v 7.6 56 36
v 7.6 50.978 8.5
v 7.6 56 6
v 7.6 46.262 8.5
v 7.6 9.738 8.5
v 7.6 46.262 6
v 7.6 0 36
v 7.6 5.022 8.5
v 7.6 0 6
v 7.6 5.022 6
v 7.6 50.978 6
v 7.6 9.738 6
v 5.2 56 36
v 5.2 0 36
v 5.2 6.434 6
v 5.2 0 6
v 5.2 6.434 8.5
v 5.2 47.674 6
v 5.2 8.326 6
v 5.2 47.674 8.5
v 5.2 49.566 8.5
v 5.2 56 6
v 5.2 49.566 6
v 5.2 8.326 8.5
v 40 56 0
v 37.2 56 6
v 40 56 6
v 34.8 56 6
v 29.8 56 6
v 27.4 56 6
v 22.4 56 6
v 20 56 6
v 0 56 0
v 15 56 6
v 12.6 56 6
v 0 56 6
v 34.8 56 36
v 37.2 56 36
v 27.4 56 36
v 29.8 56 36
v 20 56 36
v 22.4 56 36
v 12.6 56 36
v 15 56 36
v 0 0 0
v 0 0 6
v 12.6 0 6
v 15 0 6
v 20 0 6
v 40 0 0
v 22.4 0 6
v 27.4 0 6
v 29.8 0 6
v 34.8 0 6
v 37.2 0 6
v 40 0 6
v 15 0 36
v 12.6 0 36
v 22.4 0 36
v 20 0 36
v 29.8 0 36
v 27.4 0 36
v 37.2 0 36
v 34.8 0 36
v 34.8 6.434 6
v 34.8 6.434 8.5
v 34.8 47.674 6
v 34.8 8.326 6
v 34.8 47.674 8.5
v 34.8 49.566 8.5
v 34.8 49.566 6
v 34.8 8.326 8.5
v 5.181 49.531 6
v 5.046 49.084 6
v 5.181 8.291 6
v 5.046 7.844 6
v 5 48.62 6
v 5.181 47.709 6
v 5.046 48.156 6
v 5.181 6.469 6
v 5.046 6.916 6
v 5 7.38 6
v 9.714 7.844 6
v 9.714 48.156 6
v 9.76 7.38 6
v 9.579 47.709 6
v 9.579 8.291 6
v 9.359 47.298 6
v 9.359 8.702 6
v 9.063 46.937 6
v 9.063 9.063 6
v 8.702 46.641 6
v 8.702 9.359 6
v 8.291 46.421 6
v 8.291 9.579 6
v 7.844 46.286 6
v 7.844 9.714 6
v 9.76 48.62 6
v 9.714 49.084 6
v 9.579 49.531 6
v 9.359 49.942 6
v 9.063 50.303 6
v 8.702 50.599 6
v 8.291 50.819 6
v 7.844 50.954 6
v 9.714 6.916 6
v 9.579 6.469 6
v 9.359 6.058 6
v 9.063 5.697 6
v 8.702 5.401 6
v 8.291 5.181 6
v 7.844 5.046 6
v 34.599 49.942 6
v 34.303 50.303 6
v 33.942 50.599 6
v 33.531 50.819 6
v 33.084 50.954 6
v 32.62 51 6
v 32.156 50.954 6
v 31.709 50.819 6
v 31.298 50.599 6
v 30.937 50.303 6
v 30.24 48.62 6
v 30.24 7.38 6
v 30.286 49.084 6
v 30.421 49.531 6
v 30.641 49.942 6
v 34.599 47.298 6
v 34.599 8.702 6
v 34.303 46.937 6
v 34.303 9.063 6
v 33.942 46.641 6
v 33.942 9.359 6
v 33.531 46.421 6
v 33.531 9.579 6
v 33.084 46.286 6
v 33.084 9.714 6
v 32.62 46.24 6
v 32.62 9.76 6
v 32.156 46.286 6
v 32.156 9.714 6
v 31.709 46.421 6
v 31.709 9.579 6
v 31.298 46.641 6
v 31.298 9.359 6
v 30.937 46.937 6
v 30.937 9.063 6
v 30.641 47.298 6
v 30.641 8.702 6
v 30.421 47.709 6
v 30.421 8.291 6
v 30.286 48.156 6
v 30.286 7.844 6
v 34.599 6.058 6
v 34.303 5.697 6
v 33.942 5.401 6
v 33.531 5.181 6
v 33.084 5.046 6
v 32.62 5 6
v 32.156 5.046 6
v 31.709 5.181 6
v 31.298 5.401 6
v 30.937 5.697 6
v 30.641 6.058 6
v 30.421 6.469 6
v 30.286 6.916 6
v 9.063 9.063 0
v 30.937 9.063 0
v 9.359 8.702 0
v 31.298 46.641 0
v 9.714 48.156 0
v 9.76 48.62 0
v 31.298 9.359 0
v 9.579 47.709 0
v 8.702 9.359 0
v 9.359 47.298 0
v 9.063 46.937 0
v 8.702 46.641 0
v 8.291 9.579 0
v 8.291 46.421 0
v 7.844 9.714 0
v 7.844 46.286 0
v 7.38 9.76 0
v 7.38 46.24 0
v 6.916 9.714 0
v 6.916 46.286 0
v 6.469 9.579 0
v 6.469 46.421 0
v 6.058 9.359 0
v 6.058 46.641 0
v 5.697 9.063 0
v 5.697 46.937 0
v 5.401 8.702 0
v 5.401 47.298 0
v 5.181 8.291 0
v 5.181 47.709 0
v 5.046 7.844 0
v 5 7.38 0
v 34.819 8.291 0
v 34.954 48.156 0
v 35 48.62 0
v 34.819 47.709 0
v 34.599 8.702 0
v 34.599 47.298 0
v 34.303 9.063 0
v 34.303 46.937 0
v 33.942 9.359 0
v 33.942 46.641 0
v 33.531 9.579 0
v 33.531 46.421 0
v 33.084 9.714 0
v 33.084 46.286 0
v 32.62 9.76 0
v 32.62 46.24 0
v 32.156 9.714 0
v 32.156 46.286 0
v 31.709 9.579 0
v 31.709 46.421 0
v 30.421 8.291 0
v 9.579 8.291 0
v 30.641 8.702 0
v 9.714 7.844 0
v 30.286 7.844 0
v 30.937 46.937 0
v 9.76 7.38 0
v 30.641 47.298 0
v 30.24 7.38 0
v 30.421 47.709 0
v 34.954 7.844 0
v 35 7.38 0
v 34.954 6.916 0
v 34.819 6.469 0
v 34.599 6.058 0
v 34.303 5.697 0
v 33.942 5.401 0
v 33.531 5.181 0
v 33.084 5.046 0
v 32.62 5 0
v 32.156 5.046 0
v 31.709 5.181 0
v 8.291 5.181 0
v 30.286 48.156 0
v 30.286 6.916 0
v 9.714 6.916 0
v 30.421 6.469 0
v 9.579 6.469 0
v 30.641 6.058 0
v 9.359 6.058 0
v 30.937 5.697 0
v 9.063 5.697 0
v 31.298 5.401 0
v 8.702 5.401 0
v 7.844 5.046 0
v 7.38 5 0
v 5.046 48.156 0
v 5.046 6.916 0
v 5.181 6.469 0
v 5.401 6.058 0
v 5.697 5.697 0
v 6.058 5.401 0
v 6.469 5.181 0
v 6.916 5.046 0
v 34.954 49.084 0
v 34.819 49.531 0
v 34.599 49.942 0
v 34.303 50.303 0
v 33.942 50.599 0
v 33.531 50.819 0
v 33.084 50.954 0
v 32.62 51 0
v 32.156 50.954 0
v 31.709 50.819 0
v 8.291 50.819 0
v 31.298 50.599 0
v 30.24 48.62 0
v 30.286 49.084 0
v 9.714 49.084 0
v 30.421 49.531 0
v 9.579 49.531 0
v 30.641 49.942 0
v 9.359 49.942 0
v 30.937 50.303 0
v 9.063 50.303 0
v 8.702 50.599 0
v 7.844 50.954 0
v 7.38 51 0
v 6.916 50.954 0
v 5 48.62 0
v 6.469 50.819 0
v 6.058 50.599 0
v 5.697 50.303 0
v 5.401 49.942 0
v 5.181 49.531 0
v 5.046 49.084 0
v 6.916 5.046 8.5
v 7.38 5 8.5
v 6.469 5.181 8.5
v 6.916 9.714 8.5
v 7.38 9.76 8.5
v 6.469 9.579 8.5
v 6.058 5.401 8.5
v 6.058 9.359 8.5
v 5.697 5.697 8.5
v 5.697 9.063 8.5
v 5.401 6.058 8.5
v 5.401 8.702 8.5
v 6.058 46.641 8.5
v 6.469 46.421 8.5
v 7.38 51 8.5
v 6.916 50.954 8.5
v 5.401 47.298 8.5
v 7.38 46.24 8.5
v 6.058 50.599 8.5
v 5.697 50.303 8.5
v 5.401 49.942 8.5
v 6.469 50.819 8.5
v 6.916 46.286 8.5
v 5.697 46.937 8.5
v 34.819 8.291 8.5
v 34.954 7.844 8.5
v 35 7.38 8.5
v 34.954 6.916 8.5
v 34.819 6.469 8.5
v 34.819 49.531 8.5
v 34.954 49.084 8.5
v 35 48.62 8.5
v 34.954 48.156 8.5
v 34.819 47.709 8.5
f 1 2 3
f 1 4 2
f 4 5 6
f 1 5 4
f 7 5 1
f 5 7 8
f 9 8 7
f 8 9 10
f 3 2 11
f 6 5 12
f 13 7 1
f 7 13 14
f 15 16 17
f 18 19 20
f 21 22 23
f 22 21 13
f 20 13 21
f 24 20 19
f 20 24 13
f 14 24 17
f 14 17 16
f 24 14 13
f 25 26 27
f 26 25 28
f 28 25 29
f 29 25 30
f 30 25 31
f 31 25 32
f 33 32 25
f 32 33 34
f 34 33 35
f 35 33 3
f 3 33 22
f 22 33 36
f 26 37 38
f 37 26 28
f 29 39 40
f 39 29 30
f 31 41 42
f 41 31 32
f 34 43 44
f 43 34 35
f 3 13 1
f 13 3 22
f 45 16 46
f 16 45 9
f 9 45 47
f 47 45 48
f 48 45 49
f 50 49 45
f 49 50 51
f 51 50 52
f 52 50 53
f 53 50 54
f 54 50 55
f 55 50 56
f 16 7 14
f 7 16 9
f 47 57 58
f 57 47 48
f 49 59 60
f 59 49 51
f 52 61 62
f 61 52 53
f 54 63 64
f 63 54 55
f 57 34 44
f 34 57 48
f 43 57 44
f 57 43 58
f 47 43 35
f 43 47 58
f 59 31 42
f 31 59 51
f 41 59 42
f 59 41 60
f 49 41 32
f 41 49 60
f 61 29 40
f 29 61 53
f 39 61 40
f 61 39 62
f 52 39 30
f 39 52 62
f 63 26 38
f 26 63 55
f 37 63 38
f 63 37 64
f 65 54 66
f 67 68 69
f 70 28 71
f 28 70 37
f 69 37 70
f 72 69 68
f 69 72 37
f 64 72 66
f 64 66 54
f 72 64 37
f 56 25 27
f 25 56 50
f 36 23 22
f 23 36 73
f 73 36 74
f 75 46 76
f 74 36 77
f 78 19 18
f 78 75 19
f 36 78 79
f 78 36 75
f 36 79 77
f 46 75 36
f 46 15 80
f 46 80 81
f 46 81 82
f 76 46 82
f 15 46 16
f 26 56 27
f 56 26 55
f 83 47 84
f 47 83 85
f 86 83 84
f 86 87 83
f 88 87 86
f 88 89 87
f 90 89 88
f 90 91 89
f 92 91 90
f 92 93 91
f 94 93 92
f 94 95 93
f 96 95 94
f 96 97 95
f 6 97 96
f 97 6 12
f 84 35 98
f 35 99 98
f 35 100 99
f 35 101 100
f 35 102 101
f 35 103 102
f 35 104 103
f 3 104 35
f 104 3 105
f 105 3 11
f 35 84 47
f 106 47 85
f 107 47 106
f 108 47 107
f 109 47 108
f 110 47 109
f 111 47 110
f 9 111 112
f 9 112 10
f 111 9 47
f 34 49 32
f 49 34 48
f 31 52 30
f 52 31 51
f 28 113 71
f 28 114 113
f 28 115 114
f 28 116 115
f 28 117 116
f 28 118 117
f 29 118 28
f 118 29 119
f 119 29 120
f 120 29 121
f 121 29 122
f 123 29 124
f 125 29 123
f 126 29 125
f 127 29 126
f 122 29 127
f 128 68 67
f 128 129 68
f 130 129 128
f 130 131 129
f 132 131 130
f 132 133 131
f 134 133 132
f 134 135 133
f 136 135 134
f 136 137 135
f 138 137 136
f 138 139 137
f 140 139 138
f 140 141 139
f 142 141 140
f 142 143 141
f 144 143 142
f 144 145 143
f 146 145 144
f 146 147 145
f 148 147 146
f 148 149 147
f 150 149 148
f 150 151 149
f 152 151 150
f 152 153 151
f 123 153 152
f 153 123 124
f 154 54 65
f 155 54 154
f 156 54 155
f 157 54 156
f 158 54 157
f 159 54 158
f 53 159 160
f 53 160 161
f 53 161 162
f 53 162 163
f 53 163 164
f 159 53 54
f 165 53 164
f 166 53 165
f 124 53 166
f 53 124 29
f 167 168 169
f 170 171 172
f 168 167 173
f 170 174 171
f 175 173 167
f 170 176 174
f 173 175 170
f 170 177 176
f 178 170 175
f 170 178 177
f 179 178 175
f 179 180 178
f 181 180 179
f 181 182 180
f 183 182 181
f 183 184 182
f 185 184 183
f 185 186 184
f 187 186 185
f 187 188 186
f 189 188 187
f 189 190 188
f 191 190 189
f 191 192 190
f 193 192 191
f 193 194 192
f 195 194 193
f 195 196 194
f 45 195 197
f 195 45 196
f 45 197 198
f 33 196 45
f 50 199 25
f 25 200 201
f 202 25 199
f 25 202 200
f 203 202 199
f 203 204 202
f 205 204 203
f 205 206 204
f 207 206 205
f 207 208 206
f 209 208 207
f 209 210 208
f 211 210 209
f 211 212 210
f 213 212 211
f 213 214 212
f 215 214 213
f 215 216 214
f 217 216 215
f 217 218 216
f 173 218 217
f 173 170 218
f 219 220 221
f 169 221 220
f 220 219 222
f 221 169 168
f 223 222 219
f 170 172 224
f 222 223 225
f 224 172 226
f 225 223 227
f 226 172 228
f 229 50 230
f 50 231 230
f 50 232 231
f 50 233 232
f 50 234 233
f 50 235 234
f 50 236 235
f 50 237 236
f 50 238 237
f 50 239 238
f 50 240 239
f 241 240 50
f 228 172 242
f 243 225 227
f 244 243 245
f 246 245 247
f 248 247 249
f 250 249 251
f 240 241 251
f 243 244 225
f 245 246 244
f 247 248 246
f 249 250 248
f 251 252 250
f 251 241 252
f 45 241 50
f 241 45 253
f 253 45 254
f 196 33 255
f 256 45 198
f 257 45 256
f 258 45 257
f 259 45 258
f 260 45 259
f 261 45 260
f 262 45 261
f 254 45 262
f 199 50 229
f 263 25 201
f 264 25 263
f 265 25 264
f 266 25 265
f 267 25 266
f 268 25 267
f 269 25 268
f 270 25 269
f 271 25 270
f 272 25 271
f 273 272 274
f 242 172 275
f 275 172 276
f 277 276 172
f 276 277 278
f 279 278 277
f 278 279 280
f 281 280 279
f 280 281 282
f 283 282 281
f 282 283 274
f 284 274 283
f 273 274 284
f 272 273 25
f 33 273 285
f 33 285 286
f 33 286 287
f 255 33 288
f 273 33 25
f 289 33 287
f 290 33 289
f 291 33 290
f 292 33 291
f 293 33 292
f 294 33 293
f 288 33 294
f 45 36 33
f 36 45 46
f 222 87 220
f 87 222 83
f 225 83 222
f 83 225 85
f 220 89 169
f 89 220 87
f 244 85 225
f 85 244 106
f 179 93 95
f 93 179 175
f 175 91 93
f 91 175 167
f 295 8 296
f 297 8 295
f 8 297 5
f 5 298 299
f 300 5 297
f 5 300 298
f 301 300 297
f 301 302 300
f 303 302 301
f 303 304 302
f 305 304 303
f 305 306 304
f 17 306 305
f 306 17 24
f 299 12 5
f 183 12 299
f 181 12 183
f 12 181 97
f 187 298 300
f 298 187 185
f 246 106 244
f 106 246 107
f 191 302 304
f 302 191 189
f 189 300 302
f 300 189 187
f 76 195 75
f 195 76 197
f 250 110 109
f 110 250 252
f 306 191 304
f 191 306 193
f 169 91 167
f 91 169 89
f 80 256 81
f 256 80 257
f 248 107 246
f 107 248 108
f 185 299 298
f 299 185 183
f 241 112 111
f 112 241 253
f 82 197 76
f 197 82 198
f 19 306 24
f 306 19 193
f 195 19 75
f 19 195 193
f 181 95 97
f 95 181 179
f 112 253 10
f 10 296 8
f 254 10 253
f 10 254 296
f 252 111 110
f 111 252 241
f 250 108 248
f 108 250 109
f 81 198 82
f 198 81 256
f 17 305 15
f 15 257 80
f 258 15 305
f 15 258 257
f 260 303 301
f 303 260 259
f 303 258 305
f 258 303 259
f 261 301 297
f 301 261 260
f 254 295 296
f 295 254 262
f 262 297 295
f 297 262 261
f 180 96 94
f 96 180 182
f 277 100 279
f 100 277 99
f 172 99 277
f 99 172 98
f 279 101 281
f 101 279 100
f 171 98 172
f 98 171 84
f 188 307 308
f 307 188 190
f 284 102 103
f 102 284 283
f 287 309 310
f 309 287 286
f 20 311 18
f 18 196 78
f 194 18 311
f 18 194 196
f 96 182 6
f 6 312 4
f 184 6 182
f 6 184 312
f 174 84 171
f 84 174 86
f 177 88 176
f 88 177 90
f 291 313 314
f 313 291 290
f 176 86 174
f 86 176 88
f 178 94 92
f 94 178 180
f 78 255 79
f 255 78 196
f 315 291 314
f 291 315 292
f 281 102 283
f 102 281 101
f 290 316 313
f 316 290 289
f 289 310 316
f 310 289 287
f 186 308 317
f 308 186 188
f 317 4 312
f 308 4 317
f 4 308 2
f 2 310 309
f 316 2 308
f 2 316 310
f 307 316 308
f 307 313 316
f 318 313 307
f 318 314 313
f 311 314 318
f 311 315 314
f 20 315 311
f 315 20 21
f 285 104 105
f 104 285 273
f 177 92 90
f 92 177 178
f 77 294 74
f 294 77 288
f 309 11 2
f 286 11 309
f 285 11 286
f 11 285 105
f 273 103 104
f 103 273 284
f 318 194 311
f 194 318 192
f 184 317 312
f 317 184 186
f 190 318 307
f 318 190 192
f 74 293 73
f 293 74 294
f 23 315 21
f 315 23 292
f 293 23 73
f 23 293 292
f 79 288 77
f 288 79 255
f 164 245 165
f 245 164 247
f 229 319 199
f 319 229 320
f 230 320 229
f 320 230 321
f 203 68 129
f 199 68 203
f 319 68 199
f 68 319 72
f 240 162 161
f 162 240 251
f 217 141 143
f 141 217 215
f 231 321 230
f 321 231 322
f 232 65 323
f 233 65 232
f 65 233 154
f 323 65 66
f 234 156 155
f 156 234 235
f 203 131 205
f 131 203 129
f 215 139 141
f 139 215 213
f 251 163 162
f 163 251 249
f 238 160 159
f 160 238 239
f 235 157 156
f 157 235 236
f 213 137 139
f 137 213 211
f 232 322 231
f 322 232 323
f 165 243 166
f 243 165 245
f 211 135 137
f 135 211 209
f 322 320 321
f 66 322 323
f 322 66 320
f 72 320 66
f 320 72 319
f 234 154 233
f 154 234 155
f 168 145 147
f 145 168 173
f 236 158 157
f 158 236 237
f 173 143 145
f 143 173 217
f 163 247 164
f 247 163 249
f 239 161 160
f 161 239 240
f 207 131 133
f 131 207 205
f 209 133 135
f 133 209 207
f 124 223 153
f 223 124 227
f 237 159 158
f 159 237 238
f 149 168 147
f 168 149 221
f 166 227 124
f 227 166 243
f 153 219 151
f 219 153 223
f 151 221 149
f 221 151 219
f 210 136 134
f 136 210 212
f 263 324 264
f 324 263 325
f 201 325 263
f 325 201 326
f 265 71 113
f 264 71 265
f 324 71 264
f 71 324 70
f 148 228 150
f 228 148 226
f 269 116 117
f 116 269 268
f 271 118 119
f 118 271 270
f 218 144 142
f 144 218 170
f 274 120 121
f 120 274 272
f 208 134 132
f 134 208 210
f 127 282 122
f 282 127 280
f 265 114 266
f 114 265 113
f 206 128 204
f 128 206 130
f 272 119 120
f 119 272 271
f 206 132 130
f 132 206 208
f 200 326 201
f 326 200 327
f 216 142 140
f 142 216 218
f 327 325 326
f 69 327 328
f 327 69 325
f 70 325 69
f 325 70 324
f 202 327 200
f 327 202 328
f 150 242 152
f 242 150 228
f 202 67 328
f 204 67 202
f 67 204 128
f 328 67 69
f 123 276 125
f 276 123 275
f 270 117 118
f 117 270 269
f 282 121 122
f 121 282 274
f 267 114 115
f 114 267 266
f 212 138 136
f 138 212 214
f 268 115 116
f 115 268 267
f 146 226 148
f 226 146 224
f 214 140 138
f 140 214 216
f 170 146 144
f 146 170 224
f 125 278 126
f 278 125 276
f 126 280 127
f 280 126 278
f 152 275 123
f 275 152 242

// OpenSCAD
$fn = 32;

// ----------------------------------------------------------------------
// Finned heat sink: 40 x 56 mm base, 30 mm fins
// ----------------------------------------------------------------------

// --- parameters (mm) ---
base_w = 40;              // base width
base_d = 56;              // base depth
base_t = 6;               // base thickness
fin_h = 30;               // fin height above the base
holes_d = 4.76;           // fixing holes
hole_x = 12.62;           // hole offset in x
hole_y = 20.62;           // hole offset in y
fin_t = 2.4;              // fin thickness
fin_pitch = 7.4;          // fin pitch
fin_count = 5;            // number of fins
fin_x0 = 5.2;             // first fin offset

difference() {
  union() {
    cube([base_w, base_d, base_t]);
    for (i = [0 : fin_count - 1]) {
      translate([fin_x0 + i * fin_pitch, 0, base_t - 0.5]) cube([fin_t, base_d, fin_h + 0.5]);
    }
  }
  /* fixing holes through the base, 2.5 mm clear on both sides */
  for (hx = [-12.62, 12.62]) {
    for (hy = [-20.62, 20.62]) {
      translate([base_w / 2 + hx, base_d / 2 + hy, -2.5]) cylinder(h = base_t + 5, d = holes_d);
    }
  }
}
